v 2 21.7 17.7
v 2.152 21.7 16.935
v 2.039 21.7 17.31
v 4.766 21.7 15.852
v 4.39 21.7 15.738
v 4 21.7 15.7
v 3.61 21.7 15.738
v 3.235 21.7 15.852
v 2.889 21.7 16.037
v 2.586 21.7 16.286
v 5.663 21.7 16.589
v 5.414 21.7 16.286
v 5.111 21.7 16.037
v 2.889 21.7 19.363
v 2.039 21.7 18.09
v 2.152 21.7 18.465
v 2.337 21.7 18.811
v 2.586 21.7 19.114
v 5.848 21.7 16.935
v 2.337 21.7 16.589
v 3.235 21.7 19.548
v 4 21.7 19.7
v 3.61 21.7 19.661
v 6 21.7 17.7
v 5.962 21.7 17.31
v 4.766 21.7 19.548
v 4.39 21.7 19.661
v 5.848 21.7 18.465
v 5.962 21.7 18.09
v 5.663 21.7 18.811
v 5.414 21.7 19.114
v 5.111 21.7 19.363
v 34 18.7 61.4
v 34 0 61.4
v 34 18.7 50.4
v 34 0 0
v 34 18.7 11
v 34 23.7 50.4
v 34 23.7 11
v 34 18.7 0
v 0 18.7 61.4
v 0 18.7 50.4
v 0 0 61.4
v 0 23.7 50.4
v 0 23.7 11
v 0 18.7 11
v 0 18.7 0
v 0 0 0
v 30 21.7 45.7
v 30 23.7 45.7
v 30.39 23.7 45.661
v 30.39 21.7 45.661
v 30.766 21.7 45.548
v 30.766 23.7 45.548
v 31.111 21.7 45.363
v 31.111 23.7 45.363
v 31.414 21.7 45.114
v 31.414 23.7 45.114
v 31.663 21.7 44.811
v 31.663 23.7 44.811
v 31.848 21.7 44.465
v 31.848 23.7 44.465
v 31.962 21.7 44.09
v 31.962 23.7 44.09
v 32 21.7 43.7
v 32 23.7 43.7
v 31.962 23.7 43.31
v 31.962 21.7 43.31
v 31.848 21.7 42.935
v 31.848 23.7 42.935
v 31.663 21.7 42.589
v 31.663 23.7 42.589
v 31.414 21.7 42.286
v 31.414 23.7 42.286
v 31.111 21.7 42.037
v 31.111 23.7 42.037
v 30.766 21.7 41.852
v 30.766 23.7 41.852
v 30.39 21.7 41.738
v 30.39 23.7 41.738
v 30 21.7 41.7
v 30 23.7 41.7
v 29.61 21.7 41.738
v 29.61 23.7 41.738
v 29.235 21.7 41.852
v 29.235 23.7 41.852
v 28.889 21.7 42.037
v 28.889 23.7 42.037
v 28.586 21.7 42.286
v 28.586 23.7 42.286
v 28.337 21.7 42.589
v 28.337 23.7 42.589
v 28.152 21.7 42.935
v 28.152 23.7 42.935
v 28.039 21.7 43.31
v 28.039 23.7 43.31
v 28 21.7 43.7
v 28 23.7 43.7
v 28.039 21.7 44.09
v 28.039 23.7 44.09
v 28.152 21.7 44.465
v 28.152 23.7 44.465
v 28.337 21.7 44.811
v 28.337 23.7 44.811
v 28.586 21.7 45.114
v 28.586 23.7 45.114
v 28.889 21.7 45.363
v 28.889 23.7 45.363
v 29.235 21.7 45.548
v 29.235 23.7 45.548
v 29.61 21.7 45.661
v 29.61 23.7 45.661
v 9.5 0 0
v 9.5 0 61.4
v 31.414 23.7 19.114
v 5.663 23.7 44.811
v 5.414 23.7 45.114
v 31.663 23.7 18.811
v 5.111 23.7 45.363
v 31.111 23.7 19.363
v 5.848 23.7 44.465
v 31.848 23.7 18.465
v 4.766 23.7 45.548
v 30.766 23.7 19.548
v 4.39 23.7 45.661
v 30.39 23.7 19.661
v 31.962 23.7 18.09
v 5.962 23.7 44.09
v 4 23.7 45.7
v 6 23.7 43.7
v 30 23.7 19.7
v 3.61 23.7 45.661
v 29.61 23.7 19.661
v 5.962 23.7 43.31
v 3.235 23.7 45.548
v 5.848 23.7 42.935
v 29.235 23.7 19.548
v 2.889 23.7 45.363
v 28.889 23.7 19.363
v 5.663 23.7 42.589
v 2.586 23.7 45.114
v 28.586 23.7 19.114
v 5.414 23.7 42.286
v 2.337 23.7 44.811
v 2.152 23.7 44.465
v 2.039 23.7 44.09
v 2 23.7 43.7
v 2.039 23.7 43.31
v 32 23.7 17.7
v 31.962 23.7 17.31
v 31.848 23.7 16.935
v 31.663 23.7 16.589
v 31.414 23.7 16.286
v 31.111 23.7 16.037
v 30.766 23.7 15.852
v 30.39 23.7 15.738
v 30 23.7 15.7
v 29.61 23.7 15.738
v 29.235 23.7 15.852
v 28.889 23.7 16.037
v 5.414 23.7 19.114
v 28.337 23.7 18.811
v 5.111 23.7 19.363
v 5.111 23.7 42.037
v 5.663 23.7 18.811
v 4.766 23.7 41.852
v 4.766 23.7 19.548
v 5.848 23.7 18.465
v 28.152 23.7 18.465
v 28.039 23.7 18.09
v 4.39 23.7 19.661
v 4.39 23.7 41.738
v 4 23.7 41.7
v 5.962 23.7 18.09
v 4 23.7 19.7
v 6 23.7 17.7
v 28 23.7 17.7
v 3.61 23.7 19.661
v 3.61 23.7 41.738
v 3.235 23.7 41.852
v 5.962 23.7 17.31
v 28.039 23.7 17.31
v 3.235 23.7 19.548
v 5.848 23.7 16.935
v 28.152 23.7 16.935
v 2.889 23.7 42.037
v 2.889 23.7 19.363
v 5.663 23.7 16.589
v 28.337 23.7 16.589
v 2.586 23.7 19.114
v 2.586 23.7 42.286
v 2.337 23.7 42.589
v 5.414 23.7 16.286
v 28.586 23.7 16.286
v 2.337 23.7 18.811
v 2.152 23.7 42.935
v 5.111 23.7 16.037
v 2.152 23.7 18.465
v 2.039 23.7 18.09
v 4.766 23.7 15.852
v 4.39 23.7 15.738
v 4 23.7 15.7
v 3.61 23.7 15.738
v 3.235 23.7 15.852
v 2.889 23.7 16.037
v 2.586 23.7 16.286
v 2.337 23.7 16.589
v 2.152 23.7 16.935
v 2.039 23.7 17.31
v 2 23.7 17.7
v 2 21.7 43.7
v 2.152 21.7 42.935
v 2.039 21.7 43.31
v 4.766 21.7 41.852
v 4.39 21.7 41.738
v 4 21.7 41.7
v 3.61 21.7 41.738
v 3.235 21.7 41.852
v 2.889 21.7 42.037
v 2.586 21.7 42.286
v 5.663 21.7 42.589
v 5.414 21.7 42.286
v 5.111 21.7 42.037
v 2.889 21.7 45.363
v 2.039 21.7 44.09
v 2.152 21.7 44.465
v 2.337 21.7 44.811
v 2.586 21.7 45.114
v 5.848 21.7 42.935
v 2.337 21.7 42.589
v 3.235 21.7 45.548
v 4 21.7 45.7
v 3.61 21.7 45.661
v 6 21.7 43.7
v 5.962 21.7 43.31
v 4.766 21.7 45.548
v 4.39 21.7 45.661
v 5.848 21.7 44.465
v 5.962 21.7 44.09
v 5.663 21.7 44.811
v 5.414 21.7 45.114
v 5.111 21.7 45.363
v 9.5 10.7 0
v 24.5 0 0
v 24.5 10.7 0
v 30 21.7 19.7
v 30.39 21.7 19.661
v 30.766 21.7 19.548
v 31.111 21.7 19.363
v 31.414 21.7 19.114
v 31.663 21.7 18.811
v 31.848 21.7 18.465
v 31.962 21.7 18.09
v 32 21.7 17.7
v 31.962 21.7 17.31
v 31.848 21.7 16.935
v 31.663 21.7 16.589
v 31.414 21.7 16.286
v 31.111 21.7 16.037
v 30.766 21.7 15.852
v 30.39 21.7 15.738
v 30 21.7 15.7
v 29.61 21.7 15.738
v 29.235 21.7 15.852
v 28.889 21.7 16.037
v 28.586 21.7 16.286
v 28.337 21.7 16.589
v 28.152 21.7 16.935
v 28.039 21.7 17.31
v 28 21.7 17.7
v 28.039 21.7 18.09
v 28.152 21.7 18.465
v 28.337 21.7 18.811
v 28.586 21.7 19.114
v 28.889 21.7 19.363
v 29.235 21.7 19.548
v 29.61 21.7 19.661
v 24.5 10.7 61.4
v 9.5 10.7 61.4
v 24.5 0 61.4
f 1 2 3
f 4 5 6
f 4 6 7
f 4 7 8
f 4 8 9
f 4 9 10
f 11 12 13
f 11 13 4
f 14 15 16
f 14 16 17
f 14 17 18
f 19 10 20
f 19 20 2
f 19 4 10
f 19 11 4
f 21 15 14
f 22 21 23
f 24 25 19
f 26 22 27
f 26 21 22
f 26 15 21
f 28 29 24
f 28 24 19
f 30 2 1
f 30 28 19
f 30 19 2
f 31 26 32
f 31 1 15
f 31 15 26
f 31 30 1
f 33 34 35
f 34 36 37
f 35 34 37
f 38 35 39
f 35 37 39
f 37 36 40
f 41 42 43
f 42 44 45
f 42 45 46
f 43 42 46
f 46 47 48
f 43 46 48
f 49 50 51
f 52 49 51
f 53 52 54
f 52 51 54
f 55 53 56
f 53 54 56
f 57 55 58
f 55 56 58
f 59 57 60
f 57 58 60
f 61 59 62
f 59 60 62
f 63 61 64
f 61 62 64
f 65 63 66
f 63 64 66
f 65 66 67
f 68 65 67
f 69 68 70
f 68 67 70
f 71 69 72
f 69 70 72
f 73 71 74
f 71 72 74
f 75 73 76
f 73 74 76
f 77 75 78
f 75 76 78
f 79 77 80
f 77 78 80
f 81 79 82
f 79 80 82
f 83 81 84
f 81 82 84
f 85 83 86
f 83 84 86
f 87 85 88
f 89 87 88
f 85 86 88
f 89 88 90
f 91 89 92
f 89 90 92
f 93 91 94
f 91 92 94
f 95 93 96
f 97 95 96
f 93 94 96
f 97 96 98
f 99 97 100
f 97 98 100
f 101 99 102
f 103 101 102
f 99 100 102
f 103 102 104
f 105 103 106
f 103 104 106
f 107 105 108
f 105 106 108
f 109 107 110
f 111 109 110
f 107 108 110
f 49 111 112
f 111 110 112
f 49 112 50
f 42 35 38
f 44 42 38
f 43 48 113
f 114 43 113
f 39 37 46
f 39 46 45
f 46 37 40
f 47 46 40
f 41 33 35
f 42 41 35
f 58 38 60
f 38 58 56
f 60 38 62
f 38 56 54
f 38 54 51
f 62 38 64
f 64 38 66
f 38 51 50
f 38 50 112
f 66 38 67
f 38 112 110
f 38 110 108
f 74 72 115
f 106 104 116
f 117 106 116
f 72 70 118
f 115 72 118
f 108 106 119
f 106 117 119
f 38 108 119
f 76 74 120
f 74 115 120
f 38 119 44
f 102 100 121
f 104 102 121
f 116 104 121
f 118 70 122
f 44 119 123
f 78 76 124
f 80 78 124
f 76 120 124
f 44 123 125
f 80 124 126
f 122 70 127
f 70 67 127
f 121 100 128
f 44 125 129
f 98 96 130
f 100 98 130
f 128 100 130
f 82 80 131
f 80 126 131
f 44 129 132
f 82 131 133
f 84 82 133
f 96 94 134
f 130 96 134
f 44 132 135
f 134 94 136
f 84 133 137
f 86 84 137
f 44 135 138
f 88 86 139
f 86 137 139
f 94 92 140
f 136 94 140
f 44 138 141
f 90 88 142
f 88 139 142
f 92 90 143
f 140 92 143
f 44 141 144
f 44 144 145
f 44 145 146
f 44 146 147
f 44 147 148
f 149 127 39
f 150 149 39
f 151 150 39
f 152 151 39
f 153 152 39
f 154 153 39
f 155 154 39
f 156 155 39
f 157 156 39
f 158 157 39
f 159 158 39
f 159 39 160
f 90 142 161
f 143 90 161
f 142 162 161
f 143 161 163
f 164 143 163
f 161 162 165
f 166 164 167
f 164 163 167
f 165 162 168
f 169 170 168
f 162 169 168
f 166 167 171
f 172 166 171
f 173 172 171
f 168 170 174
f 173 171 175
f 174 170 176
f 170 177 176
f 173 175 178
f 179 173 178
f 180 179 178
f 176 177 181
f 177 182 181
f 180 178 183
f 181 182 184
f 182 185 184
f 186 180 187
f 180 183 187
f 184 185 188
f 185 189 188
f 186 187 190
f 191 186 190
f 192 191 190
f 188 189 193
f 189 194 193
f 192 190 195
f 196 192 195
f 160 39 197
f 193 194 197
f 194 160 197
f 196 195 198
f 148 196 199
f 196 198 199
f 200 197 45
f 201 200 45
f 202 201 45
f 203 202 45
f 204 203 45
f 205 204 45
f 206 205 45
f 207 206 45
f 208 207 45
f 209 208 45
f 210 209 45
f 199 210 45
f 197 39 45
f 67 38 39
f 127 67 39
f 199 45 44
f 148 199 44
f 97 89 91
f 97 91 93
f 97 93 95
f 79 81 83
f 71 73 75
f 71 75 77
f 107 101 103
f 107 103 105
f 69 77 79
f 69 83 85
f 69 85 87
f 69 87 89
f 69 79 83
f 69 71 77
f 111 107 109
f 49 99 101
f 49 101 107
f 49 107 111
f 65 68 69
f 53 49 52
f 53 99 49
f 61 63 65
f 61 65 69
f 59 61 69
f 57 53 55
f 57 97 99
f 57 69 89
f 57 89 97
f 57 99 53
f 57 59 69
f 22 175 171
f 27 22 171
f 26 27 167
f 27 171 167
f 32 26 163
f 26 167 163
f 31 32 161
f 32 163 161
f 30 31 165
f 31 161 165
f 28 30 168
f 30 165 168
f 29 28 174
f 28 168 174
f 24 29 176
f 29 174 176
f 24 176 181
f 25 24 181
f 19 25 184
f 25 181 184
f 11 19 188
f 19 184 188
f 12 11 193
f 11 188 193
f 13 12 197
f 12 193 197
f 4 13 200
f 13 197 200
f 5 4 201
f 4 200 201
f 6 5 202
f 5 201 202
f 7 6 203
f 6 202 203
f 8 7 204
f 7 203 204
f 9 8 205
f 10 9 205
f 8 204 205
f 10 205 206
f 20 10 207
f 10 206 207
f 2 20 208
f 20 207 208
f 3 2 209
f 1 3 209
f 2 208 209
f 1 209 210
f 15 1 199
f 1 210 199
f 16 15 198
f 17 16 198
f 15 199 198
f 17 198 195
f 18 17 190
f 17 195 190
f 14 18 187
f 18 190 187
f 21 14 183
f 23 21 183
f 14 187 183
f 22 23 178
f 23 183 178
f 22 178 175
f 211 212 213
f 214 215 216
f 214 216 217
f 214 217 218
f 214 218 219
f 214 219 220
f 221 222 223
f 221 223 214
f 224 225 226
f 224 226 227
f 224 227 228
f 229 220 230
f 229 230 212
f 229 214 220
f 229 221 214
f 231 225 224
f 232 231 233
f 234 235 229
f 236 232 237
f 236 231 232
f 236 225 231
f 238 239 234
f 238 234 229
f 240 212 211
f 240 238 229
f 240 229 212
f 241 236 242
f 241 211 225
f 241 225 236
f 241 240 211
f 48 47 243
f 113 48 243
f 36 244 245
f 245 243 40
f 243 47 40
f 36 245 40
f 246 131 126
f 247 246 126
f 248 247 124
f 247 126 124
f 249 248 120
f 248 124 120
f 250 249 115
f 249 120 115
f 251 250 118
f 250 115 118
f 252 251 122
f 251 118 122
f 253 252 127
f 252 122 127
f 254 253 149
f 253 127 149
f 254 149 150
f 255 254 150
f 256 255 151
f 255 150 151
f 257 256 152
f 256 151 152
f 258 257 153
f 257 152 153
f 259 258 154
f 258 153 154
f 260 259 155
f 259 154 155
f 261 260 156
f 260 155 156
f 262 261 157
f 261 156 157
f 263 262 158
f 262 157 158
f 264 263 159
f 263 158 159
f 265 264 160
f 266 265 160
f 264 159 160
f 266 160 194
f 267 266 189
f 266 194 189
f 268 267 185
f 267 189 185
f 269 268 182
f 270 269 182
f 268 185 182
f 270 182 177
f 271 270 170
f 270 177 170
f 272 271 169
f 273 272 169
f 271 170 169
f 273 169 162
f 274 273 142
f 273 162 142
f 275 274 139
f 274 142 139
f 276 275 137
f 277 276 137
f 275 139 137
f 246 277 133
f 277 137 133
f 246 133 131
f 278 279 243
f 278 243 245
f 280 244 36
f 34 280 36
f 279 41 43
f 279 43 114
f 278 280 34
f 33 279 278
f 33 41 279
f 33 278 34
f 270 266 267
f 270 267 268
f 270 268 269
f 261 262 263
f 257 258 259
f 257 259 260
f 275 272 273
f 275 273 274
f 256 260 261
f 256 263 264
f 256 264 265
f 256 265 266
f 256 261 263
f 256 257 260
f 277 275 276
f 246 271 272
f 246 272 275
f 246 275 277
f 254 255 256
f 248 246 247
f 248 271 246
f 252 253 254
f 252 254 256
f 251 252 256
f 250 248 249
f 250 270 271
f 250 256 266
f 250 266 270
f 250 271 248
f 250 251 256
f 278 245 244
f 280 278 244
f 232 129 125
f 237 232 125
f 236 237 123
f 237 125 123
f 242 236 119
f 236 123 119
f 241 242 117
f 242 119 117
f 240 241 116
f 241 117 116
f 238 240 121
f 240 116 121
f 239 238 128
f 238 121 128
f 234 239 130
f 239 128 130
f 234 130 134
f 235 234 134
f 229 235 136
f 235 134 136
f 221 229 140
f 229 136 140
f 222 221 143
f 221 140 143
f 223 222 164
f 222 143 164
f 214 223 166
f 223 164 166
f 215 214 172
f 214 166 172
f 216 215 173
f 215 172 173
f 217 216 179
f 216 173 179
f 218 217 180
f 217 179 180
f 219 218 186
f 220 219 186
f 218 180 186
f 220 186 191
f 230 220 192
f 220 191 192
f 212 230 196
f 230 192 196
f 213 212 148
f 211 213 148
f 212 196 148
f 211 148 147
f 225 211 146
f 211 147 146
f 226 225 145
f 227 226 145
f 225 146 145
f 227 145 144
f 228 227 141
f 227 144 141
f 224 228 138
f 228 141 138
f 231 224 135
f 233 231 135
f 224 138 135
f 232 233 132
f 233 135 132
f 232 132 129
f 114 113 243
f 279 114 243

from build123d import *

# Parameters (mm, degrees)
EXTRUDE_1_DEPTH     = 61.4
SKETCH_2_W          = 17.963644186
SKETCH_2_H          = 5.547595999
SKETCH_2_W_2        = 22.810435624
SKETCH_2_H_2        = 6.55669033
CUT_EXTRUDE_1_DEPTH = 61.4
SKETCH_3_R          = 2
CUT_EXTRUDE_2_DEPTH = 2


with BuildPart() as part:
    # Эскиз1 → Вытянуть1 (new body)
    with BuildSketch(Plane.XY):
        Polygon((24.5, 0), (34, 0), (34, 23.7), (0, 23.7), (0, 0), (9.5, 0), (9.5, 10.7), (24.5, 10.7), align=None)
    extrude(amount=EXTRUDE_1_DEPTH)

    # Эскиз2 → Вырез-Вытянуть1 (cut)
    with BuildSketch(Plane(origin=(34, 0, 0), x_dir=(0, 0, -1), z_dir=(1, 0, 0))):
        with Locations((-59.381822093, 21.473798)):
            Rectangle(SKETCH_2_W, SKETCH_2_H)
        with Locations((0.405217812, 21.978345165)):
            Rectangle(SKETCH_2_W_2, SKETCH_2_H_2)
    extrude(amount=-CUT_EXTRUDE_1_DEPTH, mode=Mode.SUBTRACT)

    # Эскиз3 → Вырез-Вытянуть2 (cut)
    with BuildSketch(Plane(origin=(0, 23.7, 0), x_dir=(-1, 0, 0), z_dir=(0, 1, 0))):
        with Locations(Location((-4.0002, 17.6999, 0), (0, 0, 90))):
            Circle(SKETCH_3_R)
        with Locations(Location((-30.0002, 17.6999, 0), (0, 0, 90))):
            Circle(SKETCH_3_R)
        with Locations(Location((-4.0002, 43.6999, 0), (0, 0, 90))):
            Circle(SKETCH_3_R)
        with Locations(Location((-30.0002, 43.6999, 0), (0, 0, 90))):
            Circle(SKETCH_3_R)
    extrude(amount=-CUT_EXTRUDE_2_DEPTH, mode=Mode.SUBTRACT)


solid = part.part
